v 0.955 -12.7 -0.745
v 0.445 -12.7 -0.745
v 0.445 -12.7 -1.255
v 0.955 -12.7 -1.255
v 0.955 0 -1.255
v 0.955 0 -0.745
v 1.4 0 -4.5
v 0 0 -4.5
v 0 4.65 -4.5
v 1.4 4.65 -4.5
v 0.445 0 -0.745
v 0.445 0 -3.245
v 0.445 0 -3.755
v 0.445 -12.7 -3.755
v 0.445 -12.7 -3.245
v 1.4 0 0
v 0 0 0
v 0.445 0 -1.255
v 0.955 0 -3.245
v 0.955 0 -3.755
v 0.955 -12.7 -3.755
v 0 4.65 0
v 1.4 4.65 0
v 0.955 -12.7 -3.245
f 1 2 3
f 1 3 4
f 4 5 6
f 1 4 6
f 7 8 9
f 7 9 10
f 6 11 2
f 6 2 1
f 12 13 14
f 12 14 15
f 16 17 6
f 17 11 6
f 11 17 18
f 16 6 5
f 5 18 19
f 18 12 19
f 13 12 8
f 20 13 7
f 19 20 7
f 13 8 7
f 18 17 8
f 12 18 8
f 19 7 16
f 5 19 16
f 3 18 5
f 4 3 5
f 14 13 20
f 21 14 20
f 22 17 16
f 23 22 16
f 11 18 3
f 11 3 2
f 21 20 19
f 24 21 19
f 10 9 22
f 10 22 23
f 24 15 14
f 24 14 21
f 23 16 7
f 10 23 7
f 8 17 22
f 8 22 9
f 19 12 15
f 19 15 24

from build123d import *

# Parameters (mm, degrees)
CROQUIS1_W              = 1.4
CROQUIS1_H              = 4.5
SALIENTE_EXTRUIR1_DEPTH = 4.65
CROQUIS2_W              = 0.51
CROQUIS2_H              = 0.51
SALIENTE_EXTRUIR2_DEPTH = 12.7


with BuildPart() as part:
    # Croquis1 → Saliente-Extruir1 (new body)
    with BuildSketch(Plane(origin=(0, 0, 0), x_dir=(1, 0, 0), z_dir=(0, 1, 0))):
        with Locations((0.7, 2.25)):
            Rectangle(CROQUIS1_W, CROQUIS1_H)
    extrude(amount=SALIENTE_EXTRUIR1_DEPTH)

    # Croquis2 → Saliente-Extruir2 (add)
    with BuildSketch(Plane.XZ):
        with Locations((0.7, -1)):
            Rectangle(CROQUIS2_W, CROQUIS2_H)
        with Locations((0.7, -3.5)):
            Rectangle(CROQUIS2_W, CROQUIS2_H)
    extrude(amount=SALIENTE_EXTRUIR2_DEPTH)


solid = part.part
